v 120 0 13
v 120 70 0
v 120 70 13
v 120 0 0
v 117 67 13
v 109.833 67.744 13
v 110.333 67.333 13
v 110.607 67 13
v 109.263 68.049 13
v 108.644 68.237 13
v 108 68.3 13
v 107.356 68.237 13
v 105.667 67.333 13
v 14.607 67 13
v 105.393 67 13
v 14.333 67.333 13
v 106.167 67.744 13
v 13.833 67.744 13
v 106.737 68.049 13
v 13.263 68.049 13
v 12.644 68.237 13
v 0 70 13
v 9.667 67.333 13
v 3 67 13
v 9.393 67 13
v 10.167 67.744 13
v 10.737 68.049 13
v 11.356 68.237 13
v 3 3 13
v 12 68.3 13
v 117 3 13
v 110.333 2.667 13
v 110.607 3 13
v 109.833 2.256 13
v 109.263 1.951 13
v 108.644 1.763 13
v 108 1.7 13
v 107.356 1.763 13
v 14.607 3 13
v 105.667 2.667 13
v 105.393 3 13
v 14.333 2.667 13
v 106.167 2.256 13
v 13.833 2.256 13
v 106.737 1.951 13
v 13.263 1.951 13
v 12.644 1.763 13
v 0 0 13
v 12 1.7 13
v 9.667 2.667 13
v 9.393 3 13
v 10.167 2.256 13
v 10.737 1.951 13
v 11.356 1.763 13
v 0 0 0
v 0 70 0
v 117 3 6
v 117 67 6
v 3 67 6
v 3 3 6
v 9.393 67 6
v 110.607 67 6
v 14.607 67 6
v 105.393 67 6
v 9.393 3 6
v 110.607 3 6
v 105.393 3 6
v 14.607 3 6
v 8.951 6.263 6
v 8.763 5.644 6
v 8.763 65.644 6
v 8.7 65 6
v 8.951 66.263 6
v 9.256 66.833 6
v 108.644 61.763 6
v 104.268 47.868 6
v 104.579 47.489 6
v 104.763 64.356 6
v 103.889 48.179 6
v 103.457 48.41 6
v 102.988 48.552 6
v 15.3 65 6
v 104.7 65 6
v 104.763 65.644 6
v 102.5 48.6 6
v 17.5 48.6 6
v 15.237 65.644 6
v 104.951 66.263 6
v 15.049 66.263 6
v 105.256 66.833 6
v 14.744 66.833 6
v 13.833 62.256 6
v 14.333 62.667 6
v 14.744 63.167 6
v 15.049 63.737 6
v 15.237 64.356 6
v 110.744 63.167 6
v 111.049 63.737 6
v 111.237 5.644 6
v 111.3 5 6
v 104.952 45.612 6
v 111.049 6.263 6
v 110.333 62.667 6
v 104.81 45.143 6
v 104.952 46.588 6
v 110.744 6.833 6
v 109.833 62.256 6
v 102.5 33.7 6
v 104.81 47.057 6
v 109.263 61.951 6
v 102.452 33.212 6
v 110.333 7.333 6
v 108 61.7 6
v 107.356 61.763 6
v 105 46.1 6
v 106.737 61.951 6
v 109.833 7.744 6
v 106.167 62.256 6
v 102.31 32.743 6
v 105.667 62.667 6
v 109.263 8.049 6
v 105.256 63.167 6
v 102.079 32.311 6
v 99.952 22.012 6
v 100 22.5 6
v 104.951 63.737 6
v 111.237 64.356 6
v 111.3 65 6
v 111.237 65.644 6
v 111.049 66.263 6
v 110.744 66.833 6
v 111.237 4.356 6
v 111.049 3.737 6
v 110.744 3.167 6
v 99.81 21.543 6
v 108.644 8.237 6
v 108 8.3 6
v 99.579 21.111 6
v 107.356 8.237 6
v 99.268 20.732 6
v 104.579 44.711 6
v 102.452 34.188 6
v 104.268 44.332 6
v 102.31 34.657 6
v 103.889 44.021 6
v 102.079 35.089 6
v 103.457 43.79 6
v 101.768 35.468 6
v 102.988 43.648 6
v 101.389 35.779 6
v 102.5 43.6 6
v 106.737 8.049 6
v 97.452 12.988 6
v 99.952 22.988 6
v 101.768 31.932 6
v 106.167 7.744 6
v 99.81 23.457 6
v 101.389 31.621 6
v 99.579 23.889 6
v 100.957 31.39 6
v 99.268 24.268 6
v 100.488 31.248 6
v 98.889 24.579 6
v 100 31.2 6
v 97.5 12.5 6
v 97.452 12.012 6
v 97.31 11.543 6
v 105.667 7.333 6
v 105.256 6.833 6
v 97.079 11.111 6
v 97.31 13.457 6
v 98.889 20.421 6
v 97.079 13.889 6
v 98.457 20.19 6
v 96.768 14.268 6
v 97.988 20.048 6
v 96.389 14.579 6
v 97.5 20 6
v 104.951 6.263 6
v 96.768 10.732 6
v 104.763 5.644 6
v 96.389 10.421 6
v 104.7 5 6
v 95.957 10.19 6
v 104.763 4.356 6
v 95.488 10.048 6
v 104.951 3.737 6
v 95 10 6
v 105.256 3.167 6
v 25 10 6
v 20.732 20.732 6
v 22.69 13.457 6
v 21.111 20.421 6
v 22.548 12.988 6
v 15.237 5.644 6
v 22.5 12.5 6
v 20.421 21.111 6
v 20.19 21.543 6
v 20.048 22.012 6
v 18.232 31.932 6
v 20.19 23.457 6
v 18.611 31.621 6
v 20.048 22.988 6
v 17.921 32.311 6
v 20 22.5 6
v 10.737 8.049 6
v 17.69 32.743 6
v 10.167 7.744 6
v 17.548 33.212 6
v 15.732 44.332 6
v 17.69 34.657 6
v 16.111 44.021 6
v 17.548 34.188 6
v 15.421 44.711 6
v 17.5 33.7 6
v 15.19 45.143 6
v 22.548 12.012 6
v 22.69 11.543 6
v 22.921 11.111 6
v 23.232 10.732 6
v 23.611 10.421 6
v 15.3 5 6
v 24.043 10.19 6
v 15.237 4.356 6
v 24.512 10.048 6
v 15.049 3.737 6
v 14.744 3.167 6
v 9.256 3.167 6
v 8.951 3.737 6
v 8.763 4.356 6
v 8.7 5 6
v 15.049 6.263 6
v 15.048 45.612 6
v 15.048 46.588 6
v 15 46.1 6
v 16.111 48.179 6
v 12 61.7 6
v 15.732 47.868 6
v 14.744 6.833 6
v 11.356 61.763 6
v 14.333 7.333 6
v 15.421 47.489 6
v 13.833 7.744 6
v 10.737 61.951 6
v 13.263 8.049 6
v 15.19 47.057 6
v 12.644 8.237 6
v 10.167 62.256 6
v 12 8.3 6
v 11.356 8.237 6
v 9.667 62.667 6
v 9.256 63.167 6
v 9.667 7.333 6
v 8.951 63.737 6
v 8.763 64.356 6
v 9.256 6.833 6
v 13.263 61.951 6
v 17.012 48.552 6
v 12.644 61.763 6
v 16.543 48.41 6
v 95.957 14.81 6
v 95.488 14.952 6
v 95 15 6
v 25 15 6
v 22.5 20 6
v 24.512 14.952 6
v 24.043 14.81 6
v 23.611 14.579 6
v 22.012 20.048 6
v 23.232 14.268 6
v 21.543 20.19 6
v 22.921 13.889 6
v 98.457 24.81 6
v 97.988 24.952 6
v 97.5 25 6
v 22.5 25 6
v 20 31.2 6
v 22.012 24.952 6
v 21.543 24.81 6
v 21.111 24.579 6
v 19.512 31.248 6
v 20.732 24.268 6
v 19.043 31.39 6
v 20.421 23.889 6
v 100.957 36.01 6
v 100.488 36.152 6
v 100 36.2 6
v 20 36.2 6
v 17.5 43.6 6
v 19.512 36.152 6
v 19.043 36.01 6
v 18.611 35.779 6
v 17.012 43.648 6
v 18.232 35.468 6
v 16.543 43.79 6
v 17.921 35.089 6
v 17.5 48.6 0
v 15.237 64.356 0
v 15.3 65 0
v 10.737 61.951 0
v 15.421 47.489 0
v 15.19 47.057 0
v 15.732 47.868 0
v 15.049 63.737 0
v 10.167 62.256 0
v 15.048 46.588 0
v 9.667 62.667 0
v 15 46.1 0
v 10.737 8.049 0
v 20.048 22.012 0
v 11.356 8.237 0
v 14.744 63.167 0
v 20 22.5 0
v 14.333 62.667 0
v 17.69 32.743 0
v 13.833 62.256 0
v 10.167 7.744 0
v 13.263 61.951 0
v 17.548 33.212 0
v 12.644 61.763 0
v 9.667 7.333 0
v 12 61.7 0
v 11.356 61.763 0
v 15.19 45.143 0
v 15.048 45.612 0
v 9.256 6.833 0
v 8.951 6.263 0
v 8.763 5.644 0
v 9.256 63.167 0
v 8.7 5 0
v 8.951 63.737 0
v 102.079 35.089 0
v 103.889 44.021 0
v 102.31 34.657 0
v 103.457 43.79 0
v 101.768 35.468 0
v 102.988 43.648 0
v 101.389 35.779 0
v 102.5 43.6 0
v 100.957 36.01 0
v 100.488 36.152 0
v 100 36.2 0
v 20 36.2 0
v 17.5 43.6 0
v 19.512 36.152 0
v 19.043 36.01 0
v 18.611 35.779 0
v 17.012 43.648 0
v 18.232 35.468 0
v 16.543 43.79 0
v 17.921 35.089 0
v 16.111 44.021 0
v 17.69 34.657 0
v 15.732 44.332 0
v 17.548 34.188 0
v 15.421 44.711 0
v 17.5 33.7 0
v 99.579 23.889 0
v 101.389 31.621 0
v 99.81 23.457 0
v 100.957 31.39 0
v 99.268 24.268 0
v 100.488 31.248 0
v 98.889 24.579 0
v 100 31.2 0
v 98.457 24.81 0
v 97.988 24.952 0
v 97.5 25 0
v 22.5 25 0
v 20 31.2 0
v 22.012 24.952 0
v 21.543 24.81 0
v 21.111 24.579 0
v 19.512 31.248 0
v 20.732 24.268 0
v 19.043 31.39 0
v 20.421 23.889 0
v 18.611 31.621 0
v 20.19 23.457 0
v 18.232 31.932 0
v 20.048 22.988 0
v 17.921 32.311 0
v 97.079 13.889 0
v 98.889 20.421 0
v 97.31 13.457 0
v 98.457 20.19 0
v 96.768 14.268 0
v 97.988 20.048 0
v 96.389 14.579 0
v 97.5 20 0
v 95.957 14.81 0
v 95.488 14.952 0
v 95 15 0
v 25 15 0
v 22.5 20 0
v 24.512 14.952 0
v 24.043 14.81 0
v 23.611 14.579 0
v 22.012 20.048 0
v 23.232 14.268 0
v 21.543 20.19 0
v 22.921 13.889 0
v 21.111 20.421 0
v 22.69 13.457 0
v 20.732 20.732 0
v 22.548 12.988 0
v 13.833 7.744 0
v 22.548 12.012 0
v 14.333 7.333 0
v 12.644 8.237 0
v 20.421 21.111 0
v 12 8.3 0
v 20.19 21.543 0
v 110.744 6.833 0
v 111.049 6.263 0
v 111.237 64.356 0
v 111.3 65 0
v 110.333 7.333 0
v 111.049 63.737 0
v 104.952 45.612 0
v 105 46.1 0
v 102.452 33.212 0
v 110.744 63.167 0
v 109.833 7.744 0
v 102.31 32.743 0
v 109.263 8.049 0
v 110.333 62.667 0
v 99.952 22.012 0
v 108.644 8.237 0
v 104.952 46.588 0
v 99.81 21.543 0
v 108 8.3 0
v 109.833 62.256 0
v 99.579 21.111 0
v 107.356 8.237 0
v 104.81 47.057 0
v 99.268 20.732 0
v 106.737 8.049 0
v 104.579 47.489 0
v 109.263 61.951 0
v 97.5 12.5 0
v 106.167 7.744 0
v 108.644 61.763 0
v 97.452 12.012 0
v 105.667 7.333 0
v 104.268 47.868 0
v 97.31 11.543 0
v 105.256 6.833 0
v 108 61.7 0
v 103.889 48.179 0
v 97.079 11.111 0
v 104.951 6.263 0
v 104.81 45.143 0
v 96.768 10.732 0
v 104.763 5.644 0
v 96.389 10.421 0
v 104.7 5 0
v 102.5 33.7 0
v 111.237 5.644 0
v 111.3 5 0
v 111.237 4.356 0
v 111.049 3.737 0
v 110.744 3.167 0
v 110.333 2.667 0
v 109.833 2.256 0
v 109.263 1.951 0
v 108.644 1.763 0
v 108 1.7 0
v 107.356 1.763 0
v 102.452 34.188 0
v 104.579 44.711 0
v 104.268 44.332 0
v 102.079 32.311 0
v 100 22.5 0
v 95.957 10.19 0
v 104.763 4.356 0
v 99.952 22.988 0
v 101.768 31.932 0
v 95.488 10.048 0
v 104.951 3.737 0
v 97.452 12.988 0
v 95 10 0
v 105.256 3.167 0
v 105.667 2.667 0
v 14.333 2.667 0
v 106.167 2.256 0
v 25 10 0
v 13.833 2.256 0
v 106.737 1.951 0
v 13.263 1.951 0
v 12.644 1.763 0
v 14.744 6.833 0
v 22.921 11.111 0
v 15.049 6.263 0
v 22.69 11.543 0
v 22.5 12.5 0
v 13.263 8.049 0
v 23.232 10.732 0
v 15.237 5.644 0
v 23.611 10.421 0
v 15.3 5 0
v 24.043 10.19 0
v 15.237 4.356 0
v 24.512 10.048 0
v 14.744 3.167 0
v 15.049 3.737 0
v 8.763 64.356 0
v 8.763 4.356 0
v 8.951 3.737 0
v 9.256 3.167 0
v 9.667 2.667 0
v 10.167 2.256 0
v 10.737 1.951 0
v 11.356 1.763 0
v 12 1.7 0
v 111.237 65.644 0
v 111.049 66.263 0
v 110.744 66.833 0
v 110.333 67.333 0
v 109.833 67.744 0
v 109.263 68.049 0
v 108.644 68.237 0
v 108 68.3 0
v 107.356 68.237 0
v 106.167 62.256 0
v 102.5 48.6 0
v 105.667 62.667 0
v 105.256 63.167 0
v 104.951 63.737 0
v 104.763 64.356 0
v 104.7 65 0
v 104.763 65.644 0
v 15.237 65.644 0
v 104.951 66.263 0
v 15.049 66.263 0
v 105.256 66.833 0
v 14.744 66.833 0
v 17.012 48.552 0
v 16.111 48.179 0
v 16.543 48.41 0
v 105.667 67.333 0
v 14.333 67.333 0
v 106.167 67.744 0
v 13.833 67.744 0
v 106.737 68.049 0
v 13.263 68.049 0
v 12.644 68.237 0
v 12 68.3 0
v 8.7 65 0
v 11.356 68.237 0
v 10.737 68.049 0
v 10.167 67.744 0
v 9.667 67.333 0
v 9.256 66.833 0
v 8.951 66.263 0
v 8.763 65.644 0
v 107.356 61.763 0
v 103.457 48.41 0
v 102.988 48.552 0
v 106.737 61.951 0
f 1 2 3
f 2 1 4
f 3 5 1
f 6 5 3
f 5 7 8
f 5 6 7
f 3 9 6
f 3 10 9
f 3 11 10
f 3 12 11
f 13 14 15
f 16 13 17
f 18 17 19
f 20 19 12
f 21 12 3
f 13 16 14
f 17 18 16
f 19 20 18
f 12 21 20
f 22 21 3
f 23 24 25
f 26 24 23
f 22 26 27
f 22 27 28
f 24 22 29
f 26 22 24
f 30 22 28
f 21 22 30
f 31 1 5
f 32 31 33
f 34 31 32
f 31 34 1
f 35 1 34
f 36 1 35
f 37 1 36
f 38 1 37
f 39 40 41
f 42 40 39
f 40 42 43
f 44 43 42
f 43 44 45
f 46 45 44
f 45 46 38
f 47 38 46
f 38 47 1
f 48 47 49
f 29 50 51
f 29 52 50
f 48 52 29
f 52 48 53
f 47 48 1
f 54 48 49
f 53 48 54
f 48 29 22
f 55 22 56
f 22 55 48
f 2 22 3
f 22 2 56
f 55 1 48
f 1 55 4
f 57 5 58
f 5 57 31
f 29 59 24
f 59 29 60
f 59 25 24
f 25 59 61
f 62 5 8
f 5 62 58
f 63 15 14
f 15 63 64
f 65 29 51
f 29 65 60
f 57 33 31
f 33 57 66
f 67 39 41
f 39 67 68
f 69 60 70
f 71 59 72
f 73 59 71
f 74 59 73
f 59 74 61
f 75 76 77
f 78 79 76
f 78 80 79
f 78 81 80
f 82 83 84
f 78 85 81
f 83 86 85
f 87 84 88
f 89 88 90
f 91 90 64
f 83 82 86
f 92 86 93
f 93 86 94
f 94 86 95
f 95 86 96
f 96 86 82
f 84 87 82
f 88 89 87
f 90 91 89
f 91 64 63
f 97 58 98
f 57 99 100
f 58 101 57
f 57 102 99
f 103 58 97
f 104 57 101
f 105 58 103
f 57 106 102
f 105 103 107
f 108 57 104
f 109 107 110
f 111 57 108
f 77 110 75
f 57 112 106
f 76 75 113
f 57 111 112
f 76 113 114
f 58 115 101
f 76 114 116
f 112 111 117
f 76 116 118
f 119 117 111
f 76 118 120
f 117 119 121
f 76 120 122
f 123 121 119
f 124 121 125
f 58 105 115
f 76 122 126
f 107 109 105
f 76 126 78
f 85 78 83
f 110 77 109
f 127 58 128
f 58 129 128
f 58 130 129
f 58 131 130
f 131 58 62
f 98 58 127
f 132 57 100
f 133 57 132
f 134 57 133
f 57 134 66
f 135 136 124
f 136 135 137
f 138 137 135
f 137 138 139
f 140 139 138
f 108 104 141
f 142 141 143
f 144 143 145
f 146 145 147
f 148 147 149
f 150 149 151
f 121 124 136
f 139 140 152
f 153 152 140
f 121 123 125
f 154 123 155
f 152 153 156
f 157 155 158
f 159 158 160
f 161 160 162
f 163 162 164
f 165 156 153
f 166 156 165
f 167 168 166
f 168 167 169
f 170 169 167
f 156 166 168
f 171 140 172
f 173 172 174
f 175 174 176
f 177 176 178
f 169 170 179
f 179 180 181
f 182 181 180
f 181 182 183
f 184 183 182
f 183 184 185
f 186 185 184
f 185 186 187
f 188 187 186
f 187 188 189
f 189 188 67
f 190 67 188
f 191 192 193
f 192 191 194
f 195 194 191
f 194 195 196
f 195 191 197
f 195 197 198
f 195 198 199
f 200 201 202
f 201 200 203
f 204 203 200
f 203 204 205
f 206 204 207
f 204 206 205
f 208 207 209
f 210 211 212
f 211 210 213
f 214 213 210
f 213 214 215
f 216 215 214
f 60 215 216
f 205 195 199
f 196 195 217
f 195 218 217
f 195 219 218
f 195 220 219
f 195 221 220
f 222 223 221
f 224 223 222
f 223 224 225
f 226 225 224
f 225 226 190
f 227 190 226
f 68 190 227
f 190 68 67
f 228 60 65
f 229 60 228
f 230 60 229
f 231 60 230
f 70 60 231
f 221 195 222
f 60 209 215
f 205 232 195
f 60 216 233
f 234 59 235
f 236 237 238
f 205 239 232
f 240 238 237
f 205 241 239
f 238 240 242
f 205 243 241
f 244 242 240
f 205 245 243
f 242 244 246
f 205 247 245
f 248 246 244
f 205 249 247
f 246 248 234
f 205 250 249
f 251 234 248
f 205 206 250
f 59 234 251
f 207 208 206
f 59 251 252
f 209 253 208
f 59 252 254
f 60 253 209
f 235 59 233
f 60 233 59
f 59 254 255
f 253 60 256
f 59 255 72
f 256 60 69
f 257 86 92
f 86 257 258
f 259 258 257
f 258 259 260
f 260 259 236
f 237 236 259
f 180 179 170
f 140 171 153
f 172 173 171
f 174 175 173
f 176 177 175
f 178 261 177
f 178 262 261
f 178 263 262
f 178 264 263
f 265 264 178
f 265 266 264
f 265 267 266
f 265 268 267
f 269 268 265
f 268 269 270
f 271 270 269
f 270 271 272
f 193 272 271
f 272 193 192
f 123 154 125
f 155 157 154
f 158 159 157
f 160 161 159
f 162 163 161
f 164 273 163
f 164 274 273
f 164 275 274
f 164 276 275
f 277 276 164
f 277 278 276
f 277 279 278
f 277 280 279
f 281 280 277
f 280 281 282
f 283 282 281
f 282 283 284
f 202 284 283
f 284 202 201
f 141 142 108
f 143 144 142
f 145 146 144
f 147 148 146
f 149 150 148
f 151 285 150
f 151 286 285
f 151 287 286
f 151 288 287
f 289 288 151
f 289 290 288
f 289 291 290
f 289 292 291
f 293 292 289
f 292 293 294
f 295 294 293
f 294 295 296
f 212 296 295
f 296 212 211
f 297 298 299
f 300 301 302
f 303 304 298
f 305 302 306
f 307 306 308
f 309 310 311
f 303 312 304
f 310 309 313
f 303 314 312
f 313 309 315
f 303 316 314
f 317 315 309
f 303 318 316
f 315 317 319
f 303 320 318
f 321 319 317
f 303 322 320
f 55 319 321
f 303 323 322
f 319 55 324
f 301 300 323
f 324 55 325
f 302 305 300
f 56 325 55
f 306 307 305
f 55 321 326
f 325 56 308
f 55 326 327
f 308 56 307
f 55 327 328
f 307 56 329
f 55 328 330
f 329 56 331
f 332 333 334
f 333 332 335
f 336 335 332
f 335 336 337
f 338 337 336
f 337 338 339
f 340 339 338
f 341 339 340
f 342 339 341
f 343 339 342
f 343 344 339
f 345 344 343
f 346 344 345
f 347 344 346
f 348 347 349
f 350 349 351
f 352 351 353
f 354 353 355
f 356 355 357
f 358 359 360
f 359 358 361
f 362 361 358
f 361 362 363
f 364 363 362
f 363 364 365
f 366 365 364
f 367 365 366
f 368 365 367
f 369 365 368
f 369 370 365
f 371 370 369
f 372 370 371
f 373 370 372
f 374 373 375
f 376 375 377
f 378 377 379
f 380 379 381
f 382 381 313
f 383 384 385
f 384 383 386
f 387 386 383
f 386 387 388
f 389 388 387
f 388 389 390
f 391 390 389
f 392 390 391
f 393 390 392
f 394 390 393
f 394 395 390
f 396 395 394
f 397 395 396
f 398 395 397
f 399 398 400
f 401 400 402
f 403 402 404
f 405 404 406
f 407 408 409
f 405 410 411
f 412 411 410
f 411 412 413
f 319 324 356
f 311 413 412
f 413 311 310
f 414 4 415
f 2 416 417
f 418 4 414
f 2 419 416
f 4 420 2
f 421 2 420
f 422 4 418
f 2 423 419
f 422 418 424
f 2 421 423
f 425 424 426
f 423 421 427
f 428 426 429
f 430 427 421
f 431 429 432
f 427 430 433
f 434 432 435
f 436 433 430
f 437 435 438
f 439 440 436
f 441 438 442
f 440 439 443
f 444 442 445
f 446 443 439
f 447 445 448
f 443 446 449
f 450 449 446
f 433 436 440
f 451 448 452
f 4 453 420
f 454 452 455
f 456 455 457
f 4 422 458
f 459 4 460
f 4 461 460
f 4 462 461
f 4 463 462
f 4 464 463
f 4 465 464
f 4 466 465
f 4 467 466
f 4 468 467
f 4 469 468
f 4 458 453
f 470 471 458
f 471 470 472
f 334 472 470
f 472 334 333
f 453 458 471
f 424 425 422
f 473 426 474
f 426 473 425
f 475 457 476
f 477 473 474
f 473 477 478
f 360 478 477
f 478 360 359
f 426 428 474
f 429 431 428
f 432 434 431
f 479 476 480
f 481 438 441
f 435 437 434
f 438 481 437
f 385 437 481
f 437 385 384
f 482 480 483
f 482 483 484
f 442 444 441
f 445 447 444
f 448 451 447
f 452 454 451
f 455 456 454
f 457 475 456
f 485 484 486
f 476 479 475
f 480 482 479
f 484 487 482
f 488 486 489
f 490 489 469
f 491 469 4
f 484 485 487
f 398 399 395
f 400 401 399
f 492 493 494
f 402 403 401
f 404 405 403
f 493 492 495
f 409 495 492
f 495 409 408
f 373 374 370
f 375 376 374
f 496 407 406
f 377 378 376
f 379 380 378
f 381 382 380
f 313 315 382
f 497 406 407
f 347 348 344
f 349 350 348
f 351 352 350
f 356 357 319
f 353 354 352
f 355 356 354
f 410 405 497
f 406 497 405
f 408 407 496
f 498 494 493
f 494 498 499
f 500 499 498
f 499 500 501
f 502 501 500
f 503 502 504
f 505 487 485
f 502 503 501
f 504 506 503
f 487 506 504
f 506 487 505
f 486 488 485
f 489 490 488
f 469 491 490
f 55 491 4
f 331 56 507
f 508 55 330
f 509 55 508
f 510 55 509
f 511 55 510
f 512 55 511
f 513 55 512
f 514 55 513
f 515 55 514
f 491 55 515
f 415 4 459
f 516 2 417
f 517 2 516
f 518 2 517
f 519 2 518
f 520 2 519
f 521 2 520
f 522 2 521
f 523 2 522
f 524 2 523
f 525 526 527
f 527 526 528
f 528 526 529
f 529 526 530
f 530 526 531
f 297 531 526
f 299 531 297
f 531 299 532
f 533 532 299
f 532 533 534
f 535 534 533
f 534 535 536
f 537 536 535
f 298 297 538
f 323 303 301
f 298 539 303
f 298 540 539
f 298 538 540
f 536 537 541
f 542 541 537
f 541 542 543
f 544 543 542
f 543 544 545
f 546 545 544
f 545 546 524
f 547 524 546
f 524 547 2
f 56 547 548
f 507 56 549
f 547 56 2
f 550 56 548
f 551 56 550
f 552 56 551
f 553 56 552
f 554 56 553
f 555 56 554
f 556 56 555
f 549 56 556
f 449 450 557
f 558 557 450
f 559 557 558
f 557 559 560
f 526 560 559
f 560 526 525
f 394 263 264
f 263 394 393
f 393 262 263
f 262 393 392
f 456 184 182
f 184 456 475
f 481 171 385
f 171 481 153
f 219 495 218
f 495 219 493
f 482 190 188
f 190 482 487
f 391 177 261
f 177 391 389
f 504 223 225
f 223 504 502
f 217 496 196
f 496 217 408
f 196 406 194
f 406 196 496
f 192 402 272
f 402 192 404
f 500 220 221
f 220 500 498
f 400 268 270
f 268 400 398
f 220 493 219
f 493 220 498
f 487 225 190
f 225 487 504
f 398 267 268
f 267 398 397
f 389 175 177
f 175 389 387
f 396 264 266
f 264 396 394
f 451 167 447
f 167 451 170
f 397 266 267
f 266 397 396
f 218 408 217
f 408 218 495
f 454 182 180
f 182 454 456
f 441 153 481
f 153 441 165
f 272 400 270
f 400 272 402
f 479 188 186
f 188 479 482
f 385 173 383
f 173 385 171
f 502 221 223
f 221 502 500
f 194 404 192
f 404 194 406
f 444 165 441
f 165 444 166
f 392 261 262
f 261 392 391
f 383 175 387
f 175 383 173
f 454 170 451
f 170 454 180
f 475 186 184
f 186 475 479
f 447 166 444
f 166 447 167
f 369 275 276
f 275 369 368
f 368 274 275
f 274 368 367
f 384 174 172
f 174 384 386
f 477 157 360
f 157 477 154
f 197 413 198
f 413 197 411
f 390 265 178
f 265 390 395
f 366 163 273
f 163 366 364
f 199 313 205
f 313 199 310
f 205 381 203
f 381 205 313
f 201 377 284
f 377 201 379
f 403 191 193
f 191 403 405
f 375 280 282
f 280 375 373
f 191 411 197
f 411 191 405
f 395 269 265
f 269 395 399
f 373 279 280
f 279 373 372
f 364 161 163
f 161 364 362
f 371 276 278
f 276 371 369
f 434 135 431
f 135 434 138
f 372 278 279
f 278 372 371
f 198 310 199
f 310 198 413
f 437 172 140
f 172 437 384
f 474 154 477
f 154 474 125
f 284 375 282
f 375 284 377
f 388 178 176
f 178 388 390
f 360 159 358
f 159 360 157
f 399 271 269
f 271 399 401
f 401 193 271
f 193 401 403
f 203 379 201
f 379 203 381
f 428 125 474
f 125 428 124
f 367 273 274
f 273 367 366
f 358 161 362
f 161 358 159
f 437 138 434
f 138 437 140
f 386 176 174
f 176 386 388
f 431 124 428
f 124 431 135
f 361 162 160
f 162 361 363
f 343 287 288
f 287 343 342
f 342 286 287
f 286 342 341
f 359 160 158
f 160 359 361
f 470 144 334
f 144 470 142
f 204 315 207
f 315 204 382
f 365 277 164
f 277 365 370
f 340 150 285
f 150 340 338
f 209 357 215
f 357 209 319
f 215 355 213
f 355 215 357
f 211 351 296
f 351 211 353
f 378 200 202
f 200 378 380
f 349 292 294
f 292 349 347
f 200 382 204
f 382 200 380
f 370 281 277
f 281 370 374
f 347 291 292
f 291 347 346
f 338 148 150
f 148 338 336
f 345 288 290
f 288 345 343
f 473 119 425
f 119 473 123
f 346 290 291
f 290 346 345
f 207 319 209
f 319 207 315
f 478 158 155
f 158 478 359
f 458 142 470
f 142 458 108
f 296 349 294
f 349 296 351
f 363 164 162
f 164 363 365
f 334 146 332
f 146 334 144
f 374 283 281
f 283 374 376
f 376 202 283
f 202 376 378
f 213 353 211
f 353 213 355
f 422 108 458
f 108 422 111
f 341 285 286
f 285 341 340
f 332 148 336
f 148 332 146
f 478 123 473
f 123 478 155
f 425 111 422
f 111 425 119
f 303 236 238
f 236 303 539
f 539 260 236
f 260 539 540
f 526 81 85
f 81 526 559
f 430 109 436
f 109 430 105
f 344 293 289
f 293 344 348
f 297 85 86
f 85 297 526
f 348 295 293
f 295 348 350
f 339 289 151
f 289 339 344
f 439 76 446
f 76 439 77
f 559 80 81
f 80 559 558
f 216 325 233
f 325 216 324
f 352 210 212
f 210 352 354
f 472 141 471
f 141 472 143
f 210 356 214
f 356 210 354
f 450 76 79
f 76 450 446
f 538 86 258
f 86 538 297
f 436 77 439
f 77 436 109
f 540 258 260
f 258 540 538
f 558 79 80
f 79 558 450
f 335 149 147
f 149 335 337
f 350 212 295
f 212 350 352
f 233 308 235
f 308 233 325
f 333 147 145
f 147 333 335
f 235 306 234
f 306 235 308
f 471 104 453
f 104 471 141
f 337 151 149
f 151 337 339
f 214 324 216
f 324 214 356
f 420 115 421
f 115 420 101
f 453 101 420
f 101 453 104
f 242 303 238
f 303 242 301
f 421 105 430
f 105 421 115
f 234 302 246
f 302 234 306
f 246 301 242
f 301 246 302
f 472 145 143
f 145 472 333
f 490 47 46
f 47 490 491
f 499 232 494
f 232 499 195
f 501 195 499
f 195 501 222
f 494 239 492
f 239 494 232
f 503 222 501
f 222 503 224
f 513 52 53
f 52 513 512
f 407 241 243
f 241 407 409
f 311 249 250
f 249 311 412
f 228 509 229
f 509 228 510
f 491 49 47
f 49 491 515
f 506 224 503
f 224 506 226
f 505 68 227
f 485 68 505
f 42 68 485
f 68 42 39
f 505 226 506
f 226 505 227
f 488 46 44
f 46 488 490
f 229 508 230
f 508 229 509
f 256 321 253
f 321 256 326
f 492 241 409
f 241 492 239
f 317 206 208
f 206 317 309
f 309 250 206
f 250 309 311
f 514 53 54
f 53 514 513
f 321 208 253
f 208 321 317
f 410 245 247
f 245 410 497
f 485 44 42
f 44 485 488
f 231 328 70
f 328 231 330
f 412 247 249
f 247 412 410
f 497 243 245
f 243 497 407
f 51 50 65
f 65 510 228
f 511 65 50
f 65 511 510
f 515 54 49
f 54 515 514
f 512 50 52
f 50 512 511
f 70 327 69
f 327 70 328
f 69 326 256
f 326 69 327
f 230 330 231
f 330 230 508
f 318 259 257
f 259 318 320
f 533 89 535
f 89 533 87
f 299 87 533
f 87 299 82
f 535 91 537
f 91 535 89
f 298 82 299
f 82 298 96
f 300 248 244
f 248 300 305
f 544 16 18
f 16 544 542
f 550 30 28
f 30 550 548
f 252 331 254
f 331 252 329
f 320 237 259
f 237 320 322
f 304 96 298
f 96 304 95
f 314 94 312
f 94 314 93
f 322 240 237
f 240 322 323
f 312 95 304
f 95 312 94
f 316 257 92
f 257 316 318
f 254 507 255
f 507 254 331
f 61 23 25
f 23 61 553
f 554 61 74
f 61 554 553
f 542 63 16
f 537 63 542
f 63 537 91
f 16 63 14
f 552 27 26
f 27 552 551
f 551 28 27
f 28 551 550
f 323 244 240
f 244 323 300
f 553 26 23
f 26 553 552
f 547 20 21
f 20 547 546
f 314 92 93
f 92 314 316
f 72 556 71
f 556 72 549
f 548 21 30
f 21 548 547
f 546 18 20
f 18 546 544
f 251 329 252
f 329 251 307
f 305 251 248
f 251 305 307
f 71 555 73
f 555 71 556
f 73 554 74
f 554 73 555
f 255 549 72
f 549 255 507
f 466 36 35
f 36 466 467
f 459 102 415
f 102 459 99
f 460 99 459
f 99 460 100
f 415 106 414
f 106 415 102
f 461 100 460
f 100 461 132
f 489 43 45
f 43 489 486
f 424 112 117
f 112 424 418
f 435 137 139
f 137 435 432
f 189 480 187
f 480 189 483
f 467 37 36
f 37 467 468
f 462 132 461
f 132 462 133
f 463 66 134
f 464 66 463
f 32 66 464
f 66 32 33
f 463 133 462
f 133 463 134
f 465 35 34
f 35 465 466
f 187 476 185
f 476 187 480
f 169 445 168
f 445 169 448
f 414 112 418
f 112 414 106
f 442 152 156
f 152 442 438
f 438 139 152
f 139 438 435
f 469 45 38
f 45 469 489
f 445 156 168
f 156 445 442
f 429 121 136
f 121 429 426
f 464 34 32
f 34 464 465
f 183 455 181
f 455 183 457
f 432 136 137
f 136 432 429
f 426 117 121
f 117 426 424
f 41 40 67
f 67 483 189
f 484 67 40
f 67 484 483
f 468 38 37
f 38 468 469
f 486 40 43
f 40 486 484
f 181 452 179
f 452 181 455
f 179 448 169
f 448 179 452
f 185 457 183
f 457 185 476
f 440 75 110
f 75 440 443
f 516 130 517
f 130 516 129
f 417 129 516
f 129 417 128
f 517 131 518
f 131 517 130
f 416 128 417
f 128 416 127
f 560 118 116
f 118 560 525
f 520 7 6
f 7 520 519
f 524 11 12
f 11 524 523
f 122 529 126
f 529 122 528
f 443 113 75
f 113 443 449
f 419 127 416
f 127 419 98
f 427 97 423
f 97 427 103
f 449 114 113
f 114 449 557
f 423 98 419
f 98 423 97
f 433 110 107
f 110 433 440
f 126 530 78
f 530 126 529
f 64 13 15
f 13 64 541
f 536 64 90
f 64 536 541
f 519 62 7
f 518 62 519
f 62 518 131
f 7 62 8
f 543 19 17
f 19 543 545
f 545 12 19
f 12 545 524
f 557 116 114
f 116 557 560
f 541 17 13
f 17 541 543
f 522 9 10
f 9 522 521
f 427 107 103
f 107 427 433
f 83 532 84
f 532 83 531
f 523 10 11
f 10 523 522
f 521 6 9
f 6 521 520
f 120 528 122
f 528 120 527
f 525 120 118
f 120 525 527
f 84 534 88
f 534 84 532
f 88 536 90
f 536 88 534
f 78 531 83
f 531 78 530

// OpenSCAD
$fn = 32;

// ----------------------------------------------------------------------
// Slotted panel: 120 x 70 mm, 4 ряда of slots
// ----------------------------------------------------------------------

// --- parameters (mm) ---
panel_w = 120;            // panel width
panel_d = 70;             // panel depth
thick = 6;                // panel thickness
slot_w = 5;               // slot width
pitch0 = 10;              // first row pitch
pitch_step = 1.2;         // pitch increase per row
margin = 10;              // margin around the slot field
rows = 4;                 // number of slot rows
mount_d = 6.6;            // mounting holes
mount_x = 48;             // mounting hole offset
rim_h = 13;               // rim height
rim_t = 3;                // rim wall thickness

difference() {
  union() {
    cube([panel_w, panel_d, thick]);
    translate([0, 0, thick - 1]) difference() {
      cube([panel_w, panel_d, rim_h - thick + 1]);
      translate([rim_t, rim_t, -2.5]) cube([panel_w - 2 * rim_t, panel_d - 2 * rim_t, rim_h - thick + 6]);
    }
  }
  /* slot rows: stadium shaped cutters, 2.5 mm clear of both faces */
  /* row 0: pitch 10, length 70 */
  hull() {
    translate([25, 12.5, -2.5]) cylinder(h = thick + 5, d = slot_w);
    translate([95, 12.5, -2.5]) cylinder(h = thick + 5, d = slot_w);
  }
  /* row 1: pitch 11.2, length 75 */
  hull() {
    translate([22.5, 22.5, -2.5]) cylinder(h = thick + 5, d = slot_w);
    translate([97.5, 22.5, -2.5]) cylinder(h = thick + 5, d = slot_w);
  }
  /* row 2: pitch 12.4, length 80 */
  hull() {
    translate([20, 33.7, -2.5]) cylinder(h = thick + 5, d = slot_w);
    translate([100, 33.7, -2.5]) cylinder(h = thick + 5, d = slot_w);
  }
  /* row 3: pitch 13.6, length 85 */
  hull() {
    translate([17.5, 46.1, -2.5]) cylinder(h = thick + 5, d = slot_w);
    translate([102.5, 46.1, -2.5]) cylinder(h = thick + 5, d = slot_w);
  }
  translate([12, 5, -2.5]) cylinder(h = 18, d = mount_d);
  translate([12, 65, -2.5]) cylinder(h = 18, d = mount_d);
  translate([108, 5, -2.5]) cylinder(h = 18, d = mount_d);
  translate([108, 65, -2.5]) cylinder(h = 18, d = mount_d);
}
